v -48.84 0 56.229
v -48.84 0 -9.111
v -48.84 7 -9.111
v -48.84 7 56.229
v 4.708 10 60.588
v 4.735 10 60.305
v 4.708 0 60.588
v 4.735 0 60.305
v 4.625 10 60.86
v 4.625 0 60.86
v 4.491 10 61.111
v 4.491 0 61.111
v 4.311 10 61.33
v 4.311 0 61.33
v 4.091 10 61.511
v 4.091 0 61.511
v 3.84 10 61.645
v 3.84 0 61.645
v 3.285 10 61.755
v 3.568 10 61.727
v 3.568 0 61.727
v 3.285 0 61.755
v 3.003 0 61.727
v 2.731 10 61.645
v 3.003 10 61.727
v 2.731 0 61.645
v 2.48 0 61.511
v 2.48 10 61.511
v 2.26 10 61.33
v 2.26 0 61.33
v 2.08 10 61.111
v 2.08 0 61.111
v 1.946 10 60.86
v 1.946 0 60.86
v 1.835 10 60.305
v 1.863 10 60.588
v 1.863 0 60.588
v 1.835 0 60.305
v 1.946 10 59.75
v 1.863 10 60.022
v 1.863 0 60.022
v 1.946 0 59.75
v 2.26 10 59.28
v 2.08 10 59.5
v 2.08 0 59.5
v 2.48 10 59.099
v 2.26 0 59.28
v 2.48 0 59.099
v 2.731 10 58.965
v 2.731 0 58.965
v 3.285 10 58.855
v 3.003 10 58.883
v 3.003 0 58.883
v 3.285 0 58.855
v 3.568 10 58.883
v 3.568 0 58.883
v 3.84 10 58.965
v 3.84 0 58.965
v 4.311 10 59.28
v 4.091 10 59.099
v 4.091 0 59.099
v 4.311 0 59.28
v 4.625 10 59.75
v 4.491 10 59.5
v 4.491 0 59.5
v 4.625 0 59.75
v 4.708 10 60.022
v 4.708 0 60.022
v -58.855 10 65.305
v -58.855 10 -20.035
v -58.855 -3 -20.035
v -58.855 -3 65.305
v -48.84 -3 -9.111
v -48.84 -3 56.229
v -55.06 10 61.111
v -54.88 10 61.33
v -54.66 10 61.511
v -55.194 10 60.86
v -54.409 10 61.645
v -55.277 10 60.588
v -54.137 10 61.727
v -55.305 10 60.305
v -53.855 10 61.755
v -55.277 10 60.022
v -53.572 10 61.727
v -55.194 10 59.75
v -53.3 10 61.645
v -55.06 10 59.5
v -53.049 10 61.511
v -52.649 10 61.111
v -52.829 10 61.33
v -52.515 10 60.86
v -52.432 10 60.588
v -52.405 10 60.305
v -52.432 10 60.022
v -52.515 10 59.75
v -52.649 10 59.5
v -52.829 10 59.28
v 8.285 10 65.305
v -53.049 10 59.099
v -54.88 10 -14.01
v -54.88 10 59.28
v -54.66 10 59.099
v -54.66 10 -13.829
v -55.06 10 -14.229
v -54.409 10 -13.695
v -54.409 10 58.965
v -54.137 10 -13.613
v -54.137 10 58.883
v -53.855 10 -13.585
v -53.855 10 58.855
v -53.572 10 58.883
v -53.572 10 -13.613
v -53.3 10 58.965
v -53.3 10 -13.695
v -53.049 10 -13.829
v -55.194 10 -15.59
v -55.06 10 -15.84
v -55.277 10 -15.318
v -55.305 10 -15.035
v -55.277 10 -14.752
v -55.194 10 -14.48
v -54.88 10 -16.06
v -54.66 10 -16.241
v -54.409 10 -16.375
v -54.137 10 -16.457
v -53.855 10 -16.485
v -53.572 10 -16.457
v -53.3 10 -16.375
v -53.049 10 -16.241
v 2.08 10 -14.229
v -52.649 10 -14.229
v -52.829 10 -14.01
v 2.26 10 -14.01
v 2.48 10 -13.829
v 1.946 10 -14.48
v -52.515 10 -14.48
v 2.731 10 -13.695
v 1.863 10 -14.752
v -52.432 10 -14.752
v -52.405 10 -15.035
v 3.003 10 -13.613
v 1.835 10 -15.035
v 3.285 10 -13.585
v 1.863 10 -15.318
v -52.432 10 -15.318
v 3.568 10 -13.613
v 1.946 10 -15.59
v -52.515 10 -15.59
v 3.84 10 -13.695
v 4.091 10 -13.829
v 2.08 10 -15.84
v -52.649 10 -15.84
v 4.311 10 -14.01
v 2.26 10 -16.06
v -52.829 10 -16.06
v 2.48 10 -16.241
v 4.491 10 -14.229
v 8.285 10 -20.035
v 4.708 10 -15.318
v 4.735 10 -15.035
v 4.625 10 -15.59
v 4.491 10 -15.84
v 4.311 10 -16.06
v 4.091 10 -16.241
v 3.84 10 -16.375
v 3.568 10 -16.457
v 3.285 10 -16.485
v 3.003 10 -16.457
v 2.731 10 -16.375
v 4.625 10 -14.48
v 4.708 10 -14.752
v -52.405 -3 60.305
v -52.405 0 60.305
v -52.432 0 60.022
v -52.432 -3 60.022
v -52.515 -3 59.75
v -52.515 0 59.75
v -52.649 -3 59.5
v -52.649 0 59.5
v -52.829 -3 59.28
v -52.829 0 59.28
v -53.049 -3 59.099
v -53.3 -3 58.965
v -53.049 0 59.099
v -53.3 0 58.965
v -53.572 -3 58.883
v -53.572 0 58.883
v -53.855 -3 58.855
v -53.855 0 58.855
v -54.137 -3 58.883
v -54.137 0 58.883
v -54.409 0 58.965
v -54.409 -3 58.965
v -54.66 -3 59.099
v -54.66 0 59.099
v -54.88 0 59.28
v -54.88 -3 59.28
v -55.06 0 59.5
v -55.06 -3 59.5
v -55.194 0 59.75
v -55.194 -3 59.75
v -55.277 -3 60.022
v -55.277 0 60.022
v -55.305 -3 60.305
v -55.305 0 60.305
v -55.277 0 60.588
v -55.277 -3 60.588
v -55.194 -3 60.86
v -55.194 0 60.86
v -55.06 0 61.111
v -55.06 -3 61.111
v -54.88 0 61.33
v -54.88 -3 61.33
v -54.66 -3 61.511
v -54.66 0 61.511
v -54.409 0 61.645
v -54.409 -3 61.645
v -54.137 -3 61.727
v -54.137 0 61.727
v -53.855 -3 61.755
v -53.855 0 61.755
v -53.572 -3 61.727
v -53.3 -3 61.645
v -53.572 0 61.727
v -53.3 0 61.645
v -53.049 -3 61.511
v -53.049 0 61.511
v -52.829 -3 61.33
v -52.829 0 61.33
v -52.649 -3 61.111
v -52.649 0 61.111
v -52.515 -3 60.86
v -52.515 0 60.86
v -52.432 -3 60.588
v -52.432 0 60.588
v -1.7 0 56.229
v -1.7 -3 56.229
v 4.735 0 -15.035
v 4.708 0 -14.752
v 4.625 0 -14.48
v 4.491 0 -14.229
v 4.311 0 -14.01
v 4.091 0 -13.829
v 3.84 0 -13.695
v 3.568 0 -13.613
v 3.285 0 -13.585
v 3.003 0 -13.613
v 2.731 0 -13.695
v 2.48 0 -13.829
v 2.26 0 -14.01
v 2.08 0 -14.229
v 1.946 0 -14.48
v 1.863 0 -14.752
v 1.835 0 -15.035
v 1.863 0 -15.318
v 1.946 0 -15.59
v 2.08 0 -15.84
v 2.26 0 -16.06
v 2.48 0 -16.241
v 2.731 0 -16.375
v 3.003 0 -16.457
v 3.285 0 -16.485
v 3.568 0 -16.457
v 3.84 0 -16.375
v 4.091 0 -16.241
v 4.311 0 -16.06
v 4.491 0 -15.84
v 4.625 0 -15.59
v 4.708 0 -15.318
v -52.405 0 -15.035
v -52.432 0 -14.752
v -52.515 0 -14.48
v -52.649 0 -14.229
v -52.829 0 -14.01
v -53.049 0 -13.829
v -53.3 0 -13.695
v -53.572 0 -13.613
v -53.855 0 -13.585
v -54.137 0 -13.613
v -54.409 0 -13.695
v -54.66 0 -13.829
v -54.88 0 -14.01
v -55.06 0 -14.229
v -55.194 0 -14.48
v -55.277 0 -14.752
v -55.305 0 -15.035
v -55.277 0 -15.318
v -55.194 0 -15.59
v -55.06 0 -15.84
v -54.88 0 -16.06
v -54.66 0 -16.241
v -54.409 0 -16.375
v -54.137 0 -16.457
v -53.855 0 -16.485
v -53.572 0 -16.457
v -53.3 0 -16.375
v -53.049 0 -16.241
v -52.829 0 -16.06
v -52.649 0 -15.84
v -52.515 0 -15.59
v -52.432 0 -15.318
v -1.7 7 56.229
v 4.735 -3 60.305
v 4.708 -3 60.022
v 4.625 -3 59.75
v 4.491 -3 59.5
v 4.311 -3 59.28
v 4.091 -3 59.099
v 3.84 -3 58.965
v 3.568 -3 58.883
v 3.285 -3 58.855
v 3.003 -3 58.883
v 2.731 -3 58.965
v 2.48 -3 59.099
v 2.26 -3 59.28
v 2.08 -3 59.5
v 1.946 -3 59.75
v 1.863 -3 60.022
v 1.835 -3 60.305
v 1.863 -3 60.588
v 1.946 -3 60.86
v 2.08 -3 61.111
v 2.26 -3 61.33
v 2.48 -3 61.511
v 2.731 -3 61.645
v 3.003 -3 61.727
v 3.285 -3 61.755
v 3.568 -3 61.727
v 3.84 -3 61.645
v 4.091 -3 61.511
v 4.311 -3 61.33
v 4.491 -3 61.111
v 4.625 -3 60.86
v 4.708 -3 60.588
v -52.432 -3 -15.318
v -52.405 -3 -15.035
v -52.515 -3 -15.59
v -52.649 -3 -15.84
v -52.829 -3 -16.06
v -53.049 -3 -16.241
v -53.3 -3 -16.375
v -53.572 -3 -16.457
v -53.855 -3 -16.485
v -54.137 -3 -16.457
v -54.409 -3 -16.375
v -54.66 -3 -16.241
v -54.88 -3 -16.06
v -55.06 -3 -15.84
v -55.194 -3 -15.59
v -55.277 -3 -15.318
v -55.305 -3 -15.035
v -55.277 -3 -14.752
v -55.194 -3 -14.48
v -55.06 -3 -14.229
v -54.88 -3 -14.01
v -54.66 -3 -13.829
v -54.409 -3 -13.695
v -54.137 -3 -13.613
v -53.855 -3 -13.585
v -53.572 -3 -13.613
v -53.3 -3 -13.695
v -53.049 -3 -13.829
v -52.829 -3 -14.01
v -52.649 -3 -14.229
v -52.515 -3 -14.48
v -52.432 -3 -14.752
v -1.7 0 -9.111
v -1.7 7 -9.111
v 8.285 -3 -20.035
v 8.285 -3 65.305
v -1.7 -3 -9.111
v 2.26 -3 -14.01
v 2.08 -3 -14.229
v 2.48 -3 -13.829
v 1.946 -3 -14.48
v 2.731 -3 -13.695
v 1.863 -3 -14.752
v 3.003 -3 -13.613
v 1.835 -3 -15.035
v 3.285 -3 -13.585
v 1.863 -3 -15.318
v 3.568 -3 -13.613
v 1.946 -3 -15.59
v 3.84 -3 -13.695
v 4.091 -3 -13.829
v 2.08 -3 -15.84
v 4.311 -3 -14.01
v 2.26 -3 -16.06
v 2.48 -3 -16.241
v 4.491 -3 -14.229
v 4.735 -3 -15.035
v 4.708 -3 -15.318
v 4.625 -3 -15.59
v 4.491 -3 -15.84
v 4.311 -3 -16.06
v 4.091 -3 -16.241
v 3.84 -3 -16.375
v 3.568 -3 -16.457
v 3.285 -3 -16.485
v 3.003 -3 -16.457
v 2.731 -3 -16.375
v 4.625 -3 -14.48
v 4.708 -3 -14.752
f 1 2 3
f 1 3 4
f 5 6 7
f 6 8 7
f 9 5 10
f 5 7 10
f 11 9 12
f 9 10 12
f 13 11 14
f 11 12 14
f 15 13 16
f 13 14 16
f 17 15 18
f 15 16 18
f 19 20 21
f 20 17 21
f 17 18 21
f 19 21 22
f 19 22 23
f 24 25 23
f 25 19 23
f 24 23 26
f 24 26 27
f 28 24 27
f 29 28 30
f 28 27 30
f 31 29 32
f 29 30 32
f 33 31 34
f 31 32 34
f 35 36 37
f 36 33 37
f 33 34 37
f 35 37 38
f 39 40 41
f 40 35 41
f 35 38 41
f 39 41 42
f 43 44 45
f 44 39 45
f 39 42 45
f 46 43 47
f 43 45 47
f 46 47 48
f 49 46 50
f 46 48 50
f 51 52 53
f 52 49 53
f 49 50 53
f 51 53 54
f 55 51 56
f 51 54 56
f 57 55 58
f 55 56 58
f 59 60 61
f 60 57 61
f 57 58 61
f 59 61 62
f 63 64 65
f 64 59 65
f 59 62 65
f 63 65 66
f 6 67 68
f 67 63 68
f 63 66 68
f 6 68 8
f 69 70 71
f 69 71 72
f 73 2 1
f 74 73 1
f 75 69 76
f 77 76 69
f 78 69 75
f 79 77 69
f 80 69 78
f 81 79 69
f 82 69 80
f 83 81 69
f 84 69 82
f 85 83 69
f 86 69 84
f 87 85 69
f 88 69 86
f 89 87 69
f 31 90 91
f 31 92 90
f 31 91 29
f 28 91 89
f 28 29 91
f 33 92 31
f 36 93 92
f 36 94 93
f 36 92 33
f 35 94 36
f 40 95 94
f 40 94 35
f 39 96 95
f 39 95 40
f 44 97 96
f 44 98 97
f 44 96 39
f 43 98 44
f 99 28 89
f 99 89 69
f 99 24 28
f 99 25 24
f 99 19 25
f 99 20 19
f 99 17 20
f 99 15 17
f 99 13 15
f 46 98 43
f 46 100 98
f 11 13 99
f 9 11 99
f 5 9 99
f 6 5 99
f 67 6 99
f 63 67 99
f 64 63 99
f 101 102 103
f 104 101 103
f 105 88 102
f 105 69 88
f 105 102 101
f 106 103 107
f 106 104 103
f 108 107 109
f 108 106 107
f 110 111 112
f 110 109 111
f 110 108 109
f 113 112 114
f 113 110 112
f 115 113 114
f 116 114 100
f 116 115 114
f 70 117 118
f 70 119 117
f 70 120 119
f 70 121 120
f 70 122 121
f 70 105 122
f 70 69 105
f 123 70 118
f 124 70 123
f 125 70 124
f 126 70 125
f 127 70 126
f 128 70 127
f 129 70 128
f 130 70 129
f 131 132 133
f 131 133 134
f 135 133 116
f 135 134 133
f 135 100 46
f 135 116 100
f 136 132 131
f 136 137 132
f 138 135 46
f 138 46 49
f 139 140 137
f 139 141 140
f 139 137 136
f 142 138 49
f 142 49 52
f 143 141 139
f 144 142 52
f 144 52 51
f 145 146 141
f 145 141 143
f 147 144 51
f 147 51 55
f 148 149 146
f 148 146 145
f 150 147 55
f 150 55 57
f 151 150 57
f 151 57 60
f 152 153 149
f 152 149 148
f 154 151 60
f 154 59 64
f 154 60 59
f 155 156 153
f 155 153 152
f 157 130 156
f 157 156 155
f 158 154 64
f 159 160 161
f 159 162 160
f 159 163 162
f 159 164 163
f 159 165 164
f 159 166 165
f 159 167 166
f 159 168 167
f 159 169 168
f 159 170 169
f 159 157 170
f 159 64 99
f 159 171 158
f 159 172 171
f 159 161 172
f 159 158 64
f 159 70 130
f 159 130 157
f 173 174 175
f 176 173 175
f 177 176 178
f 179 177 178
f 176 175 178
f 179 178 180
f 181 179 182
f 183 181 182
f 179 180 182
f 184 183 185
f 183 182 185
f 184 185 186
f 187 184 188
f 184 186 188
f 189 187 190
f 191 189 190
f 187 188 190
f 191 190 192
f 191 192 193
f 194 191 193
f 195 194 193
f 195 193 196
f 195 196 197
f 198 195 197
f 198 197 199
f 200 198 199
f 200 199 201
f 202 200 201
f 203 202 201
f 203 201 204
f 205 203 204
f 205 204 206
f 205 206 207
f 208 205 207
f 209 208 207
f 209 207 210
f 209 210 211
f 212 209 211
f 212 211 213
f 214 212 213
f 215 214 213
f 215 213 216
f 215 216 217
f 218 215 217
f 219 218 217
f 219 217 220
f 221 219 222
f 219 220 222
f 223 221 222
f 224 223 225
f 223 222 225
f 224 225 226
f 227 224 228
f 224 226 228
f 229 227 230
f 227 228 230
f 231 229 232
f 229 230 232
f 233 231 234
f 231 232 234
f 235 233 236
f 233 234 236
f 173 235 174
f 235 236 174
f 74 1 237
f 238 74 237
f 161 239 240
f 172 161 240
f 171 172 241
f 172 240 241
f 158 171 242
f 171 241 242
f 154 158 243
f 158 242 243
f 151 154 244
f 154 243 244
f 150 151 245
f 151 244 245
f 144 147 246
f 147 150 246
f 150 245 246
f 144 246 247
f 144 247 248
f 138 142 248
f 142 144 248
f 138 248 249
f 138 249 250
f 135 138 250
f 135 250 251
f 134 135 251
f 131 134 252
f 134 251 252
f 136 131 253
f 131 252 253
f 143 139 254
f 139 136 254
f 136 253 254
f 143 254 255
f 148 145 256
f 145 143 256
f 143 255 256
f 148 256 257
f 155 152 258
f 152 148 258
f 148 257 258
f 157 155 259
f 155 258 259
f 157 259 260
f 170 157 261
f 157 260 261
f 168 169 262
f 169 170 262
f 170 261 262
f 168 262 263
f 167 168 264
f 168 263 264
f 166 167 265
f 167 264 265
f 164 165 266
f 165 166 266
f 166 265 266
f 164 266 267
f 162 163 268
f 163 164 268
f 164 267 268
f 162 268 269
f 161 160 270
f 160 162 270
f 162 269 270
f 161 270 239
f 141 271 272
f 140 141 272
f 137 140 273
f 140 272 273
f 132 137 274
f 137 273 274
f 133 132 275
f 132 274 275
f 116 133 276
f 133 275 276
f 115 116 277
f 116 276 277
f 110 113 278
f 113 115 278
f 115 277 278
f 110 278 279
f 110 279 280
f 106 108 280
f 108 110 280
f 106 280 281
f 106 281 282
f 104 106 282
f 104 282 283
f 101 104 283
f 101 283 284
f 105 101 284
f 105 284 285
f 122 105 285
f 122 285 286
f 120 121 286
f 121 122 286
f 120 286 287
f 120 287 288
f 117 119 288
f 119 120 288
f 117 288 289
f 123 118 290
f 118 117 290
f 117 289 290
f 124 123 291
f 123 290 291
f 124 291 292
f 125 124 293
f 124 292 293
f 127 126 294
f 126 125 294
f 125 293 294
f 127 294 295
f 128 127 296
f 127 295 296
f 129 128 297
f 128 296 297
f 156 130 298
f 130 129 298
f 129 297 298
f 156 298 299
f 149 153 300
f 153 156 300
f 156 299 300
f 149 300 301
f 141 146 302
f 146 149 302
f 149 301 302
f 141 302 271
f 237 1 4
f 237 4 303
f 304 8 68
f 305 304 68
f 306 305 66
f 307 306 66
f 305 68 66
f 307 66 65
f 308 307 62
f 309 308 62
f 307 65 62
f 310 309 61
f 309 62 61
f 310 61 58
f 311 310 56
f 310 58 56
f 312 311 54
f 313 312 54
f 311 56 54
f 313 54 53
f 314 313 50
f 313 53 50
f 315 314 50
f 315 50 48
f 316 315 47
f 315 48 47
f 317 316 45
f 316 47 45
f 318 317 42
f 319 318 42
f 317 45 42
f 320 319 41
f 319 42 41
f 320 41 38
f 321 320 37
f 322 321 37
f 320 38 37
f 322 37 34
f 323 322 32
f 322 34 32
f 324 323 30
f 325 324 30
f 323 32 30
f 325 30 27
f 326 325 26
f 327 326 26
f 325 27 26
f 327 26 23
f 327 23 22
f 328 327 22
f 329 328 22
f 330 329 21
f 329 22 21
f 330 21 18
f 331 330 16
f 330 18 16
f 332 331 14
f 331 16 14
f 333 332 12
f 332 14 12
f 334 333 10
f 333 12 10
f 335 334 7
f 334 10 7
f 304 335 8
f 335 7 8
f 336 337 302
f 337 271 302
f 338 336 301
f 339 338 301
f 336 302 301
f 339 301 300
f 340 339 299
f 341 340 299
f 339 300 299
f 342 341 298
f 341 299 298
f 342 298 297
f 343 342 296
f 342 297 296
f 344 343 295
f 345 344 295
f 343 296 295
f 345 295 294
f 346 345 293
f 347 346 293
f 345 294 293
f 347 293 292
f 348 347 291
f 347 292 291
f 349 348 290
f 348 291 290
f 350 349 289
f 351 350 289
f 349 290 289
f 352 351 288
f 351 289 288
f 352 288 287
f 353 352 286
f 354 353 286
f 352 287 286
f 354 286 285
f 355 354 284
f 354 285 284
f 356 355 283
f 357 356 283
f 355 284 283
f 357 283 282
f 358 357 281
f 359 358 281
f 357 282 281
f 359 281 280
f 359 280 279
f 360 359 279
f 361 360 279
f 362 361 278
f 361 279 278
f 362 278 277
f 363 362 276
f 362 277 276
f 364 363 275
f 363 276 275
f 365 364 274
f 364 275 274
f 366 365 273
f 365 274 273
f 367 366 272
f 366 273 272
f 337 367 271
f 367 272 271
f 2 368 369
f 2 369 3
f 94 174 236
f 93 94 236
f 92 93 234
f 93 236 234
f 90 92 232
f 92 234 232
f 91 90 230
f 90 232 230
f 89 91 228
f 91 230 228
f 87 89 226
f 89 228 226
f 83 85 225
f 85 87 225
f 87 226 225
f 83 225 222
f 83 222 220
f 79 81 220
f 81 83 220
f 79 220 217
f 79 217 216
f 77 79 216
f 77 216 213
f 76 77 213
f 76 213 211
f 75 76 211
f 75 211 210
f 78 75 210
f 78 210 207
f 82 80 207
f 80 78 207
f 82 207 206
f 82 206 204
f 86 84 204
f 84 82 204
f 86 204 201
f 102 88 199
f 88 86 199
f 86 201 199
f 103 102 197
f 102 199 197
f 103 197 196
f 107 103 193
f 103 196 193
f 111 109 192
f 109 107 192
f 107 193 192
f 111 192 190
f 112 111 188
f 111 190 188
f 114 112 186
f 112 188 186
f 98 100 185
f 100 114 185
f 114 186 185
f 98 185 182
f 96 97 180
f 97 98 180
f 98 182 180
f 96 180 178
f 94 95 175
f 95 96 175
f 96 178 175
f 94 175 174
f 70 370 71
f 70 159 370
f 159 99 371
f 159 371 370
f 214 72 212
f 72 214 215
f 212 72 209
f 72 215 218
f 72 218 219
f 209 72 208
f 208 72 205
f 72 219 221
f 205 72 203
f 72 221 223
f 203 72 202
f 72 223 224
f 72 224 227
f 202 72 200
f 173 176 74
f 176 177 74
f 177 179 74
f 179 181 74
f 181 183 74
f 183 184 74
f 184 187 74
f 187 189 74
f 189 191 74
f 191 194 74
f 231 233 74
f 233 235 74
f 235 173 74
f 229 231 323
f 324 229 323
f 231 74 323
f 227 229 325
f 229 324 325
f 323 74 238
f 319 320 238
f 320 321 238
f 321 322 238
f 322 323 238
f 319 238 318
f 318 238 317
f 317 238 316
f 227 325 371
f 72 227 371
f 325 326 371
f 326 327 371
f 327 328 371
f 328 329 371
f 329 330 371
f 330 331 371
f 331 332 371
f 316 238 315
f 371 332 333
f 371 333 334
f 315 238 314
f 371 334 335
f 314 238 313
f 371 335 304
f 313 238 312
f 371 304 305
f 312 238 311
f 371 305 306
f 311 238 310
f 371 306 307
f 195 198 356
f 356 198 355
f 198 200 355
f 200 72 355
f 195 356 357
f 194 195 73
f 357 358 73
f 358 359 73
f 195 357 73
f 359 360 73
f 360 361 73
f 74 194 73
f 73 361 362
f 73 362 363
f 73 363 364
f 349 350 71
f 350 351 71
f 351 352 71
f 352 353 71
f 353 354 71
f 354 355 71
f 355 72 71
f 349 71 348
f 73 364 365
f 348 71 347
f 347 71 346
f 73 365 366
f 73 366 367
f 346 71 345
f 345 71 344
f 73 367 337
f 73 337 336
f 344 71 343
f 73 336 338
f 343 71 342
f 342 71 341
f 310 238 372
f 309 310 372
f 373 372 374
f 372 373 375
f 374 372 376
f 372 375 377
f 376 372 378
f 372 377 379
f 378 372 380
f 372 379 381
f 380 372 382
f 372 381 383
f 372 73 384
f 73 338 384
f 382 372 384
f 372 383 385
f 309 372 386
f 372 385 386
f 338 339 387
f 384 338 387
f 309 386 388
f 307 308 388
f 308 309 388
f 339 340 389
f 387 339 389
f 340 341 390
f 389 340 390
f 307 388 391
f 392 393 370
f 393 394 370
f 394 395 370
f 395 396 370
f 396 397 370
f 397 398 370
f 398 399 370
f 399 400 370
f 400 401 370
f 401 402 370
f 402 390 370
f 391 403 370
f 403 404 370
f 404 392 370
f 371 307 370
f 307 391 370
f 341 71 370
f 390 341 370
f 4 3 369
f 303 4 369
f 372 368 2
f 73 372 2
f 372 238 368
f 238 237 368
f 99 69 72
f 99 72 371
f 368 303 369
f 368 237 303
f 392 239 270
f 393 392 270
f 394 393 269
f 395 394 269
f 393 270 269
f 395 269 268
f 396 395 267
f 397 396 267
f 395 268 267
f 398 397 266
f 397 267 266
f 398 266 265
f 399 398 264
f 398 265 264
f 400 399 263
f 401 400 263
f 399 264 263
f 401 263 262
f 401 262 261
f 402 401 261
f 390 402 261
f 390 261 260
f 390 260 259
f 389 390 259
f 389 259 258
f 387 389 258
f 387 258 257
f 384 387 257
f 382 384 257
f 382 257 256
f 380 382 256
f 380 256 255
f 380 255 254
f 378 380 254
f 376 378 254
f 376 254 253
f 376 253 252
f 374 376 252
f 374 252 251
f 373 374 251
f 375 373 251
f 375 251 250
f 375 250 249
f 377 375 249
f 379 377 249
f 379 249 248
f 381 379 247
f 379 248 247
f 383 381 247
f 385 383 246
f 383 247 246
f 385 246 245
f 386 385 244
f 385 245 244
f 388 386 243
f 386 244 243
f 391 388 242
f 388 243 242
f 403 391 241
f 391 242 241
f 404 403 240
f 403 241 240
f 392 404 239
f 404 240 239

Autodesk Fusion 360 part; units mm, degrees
sketch "Sketch1" plane through (0, 0, 0) normal (0, 1, 0) x (1, 0, 0)
  line L0 (-48.8546, -55.3051) -> (-1.7146, -55.3051)
  line L1 (-1.7146, -55.3051) -> (-1.7146, 10.0349)
  line L2 (-1.7146, 10.0349) -> (-48.8546, 10.0349)
  line L3 (-48.8546, 10.0349) -> (-48.8546, -55.3051)
  line L4 (-58.8546, -65.3051) -> (8.2854, -65.3051)
  line L5 (8.2854, -65.3051) -> (8.2854, 20.0349)
  line L6 (8.2854, 20.0349) -> (-58.8546, 20.0349)
  line L7 (-58.8546, 20.0349) -> (-58.8546, -65.3051)
  circle A0 centre (-53.8546, -60.3051) radius 1.45
  circle A1 centre (-53.8546, 15.0349) radius 1.45
  circle A2 centre (3.2854, 15.0349) radius 1.45
  circle A3 centre (3.2854, -60.3051) radius 1.45
  dimension "d1" = 47.14
  dimension "d2" = 65.34
  dimension "d3" = 10
  dimension "d4" = 10
  dimension "d5" = 10
  dimension "d6" = 10
  dimension "d7" = 2.9
  dimension "d8" = 5
  dimension "d9" = 5
  dimension "d10" = 2.9
  dimension "d11" = 5
  dimension "d12" = 5
  dimension "d13" = 2.9
  dimension "d14" = 5
  dimension "d15" = 5
  dimension "d16" = 2.9
  dimension "d17" = 5
  dimension "d18" = 5
extrude "Extrude1" add sketch "Sketch1" along normal blind 10 contours L0 L1 L2 L3 | L4 L5 L6 L7
sketch "Sketch2" plane through (0, 0, 0) normal (0, 1, 0) x (1, 0, 0)
  line L0 (-48.8399, -56.2293) -> (-1.6999, -56.2293)
  line L1 (-1.6999, -56.2293) -> (-1.6999, 9.1107)
  line L2 (-1.6999, 9.1107) -> (-48.8399, 9.1107)
  line L3 (-48.8399, 9.1107) -> (-48.8399, -56.2293)
  dimension "d21" = 47.14
  dimension "d22" = 65.34
extrude "Extrude2" cut sketch "Sketch2" along normal blind 7
extrude "Extrude3" add 1 faces at (-33.1363, 0, -13.4796) along direction (0, -1, 0) blind 3
